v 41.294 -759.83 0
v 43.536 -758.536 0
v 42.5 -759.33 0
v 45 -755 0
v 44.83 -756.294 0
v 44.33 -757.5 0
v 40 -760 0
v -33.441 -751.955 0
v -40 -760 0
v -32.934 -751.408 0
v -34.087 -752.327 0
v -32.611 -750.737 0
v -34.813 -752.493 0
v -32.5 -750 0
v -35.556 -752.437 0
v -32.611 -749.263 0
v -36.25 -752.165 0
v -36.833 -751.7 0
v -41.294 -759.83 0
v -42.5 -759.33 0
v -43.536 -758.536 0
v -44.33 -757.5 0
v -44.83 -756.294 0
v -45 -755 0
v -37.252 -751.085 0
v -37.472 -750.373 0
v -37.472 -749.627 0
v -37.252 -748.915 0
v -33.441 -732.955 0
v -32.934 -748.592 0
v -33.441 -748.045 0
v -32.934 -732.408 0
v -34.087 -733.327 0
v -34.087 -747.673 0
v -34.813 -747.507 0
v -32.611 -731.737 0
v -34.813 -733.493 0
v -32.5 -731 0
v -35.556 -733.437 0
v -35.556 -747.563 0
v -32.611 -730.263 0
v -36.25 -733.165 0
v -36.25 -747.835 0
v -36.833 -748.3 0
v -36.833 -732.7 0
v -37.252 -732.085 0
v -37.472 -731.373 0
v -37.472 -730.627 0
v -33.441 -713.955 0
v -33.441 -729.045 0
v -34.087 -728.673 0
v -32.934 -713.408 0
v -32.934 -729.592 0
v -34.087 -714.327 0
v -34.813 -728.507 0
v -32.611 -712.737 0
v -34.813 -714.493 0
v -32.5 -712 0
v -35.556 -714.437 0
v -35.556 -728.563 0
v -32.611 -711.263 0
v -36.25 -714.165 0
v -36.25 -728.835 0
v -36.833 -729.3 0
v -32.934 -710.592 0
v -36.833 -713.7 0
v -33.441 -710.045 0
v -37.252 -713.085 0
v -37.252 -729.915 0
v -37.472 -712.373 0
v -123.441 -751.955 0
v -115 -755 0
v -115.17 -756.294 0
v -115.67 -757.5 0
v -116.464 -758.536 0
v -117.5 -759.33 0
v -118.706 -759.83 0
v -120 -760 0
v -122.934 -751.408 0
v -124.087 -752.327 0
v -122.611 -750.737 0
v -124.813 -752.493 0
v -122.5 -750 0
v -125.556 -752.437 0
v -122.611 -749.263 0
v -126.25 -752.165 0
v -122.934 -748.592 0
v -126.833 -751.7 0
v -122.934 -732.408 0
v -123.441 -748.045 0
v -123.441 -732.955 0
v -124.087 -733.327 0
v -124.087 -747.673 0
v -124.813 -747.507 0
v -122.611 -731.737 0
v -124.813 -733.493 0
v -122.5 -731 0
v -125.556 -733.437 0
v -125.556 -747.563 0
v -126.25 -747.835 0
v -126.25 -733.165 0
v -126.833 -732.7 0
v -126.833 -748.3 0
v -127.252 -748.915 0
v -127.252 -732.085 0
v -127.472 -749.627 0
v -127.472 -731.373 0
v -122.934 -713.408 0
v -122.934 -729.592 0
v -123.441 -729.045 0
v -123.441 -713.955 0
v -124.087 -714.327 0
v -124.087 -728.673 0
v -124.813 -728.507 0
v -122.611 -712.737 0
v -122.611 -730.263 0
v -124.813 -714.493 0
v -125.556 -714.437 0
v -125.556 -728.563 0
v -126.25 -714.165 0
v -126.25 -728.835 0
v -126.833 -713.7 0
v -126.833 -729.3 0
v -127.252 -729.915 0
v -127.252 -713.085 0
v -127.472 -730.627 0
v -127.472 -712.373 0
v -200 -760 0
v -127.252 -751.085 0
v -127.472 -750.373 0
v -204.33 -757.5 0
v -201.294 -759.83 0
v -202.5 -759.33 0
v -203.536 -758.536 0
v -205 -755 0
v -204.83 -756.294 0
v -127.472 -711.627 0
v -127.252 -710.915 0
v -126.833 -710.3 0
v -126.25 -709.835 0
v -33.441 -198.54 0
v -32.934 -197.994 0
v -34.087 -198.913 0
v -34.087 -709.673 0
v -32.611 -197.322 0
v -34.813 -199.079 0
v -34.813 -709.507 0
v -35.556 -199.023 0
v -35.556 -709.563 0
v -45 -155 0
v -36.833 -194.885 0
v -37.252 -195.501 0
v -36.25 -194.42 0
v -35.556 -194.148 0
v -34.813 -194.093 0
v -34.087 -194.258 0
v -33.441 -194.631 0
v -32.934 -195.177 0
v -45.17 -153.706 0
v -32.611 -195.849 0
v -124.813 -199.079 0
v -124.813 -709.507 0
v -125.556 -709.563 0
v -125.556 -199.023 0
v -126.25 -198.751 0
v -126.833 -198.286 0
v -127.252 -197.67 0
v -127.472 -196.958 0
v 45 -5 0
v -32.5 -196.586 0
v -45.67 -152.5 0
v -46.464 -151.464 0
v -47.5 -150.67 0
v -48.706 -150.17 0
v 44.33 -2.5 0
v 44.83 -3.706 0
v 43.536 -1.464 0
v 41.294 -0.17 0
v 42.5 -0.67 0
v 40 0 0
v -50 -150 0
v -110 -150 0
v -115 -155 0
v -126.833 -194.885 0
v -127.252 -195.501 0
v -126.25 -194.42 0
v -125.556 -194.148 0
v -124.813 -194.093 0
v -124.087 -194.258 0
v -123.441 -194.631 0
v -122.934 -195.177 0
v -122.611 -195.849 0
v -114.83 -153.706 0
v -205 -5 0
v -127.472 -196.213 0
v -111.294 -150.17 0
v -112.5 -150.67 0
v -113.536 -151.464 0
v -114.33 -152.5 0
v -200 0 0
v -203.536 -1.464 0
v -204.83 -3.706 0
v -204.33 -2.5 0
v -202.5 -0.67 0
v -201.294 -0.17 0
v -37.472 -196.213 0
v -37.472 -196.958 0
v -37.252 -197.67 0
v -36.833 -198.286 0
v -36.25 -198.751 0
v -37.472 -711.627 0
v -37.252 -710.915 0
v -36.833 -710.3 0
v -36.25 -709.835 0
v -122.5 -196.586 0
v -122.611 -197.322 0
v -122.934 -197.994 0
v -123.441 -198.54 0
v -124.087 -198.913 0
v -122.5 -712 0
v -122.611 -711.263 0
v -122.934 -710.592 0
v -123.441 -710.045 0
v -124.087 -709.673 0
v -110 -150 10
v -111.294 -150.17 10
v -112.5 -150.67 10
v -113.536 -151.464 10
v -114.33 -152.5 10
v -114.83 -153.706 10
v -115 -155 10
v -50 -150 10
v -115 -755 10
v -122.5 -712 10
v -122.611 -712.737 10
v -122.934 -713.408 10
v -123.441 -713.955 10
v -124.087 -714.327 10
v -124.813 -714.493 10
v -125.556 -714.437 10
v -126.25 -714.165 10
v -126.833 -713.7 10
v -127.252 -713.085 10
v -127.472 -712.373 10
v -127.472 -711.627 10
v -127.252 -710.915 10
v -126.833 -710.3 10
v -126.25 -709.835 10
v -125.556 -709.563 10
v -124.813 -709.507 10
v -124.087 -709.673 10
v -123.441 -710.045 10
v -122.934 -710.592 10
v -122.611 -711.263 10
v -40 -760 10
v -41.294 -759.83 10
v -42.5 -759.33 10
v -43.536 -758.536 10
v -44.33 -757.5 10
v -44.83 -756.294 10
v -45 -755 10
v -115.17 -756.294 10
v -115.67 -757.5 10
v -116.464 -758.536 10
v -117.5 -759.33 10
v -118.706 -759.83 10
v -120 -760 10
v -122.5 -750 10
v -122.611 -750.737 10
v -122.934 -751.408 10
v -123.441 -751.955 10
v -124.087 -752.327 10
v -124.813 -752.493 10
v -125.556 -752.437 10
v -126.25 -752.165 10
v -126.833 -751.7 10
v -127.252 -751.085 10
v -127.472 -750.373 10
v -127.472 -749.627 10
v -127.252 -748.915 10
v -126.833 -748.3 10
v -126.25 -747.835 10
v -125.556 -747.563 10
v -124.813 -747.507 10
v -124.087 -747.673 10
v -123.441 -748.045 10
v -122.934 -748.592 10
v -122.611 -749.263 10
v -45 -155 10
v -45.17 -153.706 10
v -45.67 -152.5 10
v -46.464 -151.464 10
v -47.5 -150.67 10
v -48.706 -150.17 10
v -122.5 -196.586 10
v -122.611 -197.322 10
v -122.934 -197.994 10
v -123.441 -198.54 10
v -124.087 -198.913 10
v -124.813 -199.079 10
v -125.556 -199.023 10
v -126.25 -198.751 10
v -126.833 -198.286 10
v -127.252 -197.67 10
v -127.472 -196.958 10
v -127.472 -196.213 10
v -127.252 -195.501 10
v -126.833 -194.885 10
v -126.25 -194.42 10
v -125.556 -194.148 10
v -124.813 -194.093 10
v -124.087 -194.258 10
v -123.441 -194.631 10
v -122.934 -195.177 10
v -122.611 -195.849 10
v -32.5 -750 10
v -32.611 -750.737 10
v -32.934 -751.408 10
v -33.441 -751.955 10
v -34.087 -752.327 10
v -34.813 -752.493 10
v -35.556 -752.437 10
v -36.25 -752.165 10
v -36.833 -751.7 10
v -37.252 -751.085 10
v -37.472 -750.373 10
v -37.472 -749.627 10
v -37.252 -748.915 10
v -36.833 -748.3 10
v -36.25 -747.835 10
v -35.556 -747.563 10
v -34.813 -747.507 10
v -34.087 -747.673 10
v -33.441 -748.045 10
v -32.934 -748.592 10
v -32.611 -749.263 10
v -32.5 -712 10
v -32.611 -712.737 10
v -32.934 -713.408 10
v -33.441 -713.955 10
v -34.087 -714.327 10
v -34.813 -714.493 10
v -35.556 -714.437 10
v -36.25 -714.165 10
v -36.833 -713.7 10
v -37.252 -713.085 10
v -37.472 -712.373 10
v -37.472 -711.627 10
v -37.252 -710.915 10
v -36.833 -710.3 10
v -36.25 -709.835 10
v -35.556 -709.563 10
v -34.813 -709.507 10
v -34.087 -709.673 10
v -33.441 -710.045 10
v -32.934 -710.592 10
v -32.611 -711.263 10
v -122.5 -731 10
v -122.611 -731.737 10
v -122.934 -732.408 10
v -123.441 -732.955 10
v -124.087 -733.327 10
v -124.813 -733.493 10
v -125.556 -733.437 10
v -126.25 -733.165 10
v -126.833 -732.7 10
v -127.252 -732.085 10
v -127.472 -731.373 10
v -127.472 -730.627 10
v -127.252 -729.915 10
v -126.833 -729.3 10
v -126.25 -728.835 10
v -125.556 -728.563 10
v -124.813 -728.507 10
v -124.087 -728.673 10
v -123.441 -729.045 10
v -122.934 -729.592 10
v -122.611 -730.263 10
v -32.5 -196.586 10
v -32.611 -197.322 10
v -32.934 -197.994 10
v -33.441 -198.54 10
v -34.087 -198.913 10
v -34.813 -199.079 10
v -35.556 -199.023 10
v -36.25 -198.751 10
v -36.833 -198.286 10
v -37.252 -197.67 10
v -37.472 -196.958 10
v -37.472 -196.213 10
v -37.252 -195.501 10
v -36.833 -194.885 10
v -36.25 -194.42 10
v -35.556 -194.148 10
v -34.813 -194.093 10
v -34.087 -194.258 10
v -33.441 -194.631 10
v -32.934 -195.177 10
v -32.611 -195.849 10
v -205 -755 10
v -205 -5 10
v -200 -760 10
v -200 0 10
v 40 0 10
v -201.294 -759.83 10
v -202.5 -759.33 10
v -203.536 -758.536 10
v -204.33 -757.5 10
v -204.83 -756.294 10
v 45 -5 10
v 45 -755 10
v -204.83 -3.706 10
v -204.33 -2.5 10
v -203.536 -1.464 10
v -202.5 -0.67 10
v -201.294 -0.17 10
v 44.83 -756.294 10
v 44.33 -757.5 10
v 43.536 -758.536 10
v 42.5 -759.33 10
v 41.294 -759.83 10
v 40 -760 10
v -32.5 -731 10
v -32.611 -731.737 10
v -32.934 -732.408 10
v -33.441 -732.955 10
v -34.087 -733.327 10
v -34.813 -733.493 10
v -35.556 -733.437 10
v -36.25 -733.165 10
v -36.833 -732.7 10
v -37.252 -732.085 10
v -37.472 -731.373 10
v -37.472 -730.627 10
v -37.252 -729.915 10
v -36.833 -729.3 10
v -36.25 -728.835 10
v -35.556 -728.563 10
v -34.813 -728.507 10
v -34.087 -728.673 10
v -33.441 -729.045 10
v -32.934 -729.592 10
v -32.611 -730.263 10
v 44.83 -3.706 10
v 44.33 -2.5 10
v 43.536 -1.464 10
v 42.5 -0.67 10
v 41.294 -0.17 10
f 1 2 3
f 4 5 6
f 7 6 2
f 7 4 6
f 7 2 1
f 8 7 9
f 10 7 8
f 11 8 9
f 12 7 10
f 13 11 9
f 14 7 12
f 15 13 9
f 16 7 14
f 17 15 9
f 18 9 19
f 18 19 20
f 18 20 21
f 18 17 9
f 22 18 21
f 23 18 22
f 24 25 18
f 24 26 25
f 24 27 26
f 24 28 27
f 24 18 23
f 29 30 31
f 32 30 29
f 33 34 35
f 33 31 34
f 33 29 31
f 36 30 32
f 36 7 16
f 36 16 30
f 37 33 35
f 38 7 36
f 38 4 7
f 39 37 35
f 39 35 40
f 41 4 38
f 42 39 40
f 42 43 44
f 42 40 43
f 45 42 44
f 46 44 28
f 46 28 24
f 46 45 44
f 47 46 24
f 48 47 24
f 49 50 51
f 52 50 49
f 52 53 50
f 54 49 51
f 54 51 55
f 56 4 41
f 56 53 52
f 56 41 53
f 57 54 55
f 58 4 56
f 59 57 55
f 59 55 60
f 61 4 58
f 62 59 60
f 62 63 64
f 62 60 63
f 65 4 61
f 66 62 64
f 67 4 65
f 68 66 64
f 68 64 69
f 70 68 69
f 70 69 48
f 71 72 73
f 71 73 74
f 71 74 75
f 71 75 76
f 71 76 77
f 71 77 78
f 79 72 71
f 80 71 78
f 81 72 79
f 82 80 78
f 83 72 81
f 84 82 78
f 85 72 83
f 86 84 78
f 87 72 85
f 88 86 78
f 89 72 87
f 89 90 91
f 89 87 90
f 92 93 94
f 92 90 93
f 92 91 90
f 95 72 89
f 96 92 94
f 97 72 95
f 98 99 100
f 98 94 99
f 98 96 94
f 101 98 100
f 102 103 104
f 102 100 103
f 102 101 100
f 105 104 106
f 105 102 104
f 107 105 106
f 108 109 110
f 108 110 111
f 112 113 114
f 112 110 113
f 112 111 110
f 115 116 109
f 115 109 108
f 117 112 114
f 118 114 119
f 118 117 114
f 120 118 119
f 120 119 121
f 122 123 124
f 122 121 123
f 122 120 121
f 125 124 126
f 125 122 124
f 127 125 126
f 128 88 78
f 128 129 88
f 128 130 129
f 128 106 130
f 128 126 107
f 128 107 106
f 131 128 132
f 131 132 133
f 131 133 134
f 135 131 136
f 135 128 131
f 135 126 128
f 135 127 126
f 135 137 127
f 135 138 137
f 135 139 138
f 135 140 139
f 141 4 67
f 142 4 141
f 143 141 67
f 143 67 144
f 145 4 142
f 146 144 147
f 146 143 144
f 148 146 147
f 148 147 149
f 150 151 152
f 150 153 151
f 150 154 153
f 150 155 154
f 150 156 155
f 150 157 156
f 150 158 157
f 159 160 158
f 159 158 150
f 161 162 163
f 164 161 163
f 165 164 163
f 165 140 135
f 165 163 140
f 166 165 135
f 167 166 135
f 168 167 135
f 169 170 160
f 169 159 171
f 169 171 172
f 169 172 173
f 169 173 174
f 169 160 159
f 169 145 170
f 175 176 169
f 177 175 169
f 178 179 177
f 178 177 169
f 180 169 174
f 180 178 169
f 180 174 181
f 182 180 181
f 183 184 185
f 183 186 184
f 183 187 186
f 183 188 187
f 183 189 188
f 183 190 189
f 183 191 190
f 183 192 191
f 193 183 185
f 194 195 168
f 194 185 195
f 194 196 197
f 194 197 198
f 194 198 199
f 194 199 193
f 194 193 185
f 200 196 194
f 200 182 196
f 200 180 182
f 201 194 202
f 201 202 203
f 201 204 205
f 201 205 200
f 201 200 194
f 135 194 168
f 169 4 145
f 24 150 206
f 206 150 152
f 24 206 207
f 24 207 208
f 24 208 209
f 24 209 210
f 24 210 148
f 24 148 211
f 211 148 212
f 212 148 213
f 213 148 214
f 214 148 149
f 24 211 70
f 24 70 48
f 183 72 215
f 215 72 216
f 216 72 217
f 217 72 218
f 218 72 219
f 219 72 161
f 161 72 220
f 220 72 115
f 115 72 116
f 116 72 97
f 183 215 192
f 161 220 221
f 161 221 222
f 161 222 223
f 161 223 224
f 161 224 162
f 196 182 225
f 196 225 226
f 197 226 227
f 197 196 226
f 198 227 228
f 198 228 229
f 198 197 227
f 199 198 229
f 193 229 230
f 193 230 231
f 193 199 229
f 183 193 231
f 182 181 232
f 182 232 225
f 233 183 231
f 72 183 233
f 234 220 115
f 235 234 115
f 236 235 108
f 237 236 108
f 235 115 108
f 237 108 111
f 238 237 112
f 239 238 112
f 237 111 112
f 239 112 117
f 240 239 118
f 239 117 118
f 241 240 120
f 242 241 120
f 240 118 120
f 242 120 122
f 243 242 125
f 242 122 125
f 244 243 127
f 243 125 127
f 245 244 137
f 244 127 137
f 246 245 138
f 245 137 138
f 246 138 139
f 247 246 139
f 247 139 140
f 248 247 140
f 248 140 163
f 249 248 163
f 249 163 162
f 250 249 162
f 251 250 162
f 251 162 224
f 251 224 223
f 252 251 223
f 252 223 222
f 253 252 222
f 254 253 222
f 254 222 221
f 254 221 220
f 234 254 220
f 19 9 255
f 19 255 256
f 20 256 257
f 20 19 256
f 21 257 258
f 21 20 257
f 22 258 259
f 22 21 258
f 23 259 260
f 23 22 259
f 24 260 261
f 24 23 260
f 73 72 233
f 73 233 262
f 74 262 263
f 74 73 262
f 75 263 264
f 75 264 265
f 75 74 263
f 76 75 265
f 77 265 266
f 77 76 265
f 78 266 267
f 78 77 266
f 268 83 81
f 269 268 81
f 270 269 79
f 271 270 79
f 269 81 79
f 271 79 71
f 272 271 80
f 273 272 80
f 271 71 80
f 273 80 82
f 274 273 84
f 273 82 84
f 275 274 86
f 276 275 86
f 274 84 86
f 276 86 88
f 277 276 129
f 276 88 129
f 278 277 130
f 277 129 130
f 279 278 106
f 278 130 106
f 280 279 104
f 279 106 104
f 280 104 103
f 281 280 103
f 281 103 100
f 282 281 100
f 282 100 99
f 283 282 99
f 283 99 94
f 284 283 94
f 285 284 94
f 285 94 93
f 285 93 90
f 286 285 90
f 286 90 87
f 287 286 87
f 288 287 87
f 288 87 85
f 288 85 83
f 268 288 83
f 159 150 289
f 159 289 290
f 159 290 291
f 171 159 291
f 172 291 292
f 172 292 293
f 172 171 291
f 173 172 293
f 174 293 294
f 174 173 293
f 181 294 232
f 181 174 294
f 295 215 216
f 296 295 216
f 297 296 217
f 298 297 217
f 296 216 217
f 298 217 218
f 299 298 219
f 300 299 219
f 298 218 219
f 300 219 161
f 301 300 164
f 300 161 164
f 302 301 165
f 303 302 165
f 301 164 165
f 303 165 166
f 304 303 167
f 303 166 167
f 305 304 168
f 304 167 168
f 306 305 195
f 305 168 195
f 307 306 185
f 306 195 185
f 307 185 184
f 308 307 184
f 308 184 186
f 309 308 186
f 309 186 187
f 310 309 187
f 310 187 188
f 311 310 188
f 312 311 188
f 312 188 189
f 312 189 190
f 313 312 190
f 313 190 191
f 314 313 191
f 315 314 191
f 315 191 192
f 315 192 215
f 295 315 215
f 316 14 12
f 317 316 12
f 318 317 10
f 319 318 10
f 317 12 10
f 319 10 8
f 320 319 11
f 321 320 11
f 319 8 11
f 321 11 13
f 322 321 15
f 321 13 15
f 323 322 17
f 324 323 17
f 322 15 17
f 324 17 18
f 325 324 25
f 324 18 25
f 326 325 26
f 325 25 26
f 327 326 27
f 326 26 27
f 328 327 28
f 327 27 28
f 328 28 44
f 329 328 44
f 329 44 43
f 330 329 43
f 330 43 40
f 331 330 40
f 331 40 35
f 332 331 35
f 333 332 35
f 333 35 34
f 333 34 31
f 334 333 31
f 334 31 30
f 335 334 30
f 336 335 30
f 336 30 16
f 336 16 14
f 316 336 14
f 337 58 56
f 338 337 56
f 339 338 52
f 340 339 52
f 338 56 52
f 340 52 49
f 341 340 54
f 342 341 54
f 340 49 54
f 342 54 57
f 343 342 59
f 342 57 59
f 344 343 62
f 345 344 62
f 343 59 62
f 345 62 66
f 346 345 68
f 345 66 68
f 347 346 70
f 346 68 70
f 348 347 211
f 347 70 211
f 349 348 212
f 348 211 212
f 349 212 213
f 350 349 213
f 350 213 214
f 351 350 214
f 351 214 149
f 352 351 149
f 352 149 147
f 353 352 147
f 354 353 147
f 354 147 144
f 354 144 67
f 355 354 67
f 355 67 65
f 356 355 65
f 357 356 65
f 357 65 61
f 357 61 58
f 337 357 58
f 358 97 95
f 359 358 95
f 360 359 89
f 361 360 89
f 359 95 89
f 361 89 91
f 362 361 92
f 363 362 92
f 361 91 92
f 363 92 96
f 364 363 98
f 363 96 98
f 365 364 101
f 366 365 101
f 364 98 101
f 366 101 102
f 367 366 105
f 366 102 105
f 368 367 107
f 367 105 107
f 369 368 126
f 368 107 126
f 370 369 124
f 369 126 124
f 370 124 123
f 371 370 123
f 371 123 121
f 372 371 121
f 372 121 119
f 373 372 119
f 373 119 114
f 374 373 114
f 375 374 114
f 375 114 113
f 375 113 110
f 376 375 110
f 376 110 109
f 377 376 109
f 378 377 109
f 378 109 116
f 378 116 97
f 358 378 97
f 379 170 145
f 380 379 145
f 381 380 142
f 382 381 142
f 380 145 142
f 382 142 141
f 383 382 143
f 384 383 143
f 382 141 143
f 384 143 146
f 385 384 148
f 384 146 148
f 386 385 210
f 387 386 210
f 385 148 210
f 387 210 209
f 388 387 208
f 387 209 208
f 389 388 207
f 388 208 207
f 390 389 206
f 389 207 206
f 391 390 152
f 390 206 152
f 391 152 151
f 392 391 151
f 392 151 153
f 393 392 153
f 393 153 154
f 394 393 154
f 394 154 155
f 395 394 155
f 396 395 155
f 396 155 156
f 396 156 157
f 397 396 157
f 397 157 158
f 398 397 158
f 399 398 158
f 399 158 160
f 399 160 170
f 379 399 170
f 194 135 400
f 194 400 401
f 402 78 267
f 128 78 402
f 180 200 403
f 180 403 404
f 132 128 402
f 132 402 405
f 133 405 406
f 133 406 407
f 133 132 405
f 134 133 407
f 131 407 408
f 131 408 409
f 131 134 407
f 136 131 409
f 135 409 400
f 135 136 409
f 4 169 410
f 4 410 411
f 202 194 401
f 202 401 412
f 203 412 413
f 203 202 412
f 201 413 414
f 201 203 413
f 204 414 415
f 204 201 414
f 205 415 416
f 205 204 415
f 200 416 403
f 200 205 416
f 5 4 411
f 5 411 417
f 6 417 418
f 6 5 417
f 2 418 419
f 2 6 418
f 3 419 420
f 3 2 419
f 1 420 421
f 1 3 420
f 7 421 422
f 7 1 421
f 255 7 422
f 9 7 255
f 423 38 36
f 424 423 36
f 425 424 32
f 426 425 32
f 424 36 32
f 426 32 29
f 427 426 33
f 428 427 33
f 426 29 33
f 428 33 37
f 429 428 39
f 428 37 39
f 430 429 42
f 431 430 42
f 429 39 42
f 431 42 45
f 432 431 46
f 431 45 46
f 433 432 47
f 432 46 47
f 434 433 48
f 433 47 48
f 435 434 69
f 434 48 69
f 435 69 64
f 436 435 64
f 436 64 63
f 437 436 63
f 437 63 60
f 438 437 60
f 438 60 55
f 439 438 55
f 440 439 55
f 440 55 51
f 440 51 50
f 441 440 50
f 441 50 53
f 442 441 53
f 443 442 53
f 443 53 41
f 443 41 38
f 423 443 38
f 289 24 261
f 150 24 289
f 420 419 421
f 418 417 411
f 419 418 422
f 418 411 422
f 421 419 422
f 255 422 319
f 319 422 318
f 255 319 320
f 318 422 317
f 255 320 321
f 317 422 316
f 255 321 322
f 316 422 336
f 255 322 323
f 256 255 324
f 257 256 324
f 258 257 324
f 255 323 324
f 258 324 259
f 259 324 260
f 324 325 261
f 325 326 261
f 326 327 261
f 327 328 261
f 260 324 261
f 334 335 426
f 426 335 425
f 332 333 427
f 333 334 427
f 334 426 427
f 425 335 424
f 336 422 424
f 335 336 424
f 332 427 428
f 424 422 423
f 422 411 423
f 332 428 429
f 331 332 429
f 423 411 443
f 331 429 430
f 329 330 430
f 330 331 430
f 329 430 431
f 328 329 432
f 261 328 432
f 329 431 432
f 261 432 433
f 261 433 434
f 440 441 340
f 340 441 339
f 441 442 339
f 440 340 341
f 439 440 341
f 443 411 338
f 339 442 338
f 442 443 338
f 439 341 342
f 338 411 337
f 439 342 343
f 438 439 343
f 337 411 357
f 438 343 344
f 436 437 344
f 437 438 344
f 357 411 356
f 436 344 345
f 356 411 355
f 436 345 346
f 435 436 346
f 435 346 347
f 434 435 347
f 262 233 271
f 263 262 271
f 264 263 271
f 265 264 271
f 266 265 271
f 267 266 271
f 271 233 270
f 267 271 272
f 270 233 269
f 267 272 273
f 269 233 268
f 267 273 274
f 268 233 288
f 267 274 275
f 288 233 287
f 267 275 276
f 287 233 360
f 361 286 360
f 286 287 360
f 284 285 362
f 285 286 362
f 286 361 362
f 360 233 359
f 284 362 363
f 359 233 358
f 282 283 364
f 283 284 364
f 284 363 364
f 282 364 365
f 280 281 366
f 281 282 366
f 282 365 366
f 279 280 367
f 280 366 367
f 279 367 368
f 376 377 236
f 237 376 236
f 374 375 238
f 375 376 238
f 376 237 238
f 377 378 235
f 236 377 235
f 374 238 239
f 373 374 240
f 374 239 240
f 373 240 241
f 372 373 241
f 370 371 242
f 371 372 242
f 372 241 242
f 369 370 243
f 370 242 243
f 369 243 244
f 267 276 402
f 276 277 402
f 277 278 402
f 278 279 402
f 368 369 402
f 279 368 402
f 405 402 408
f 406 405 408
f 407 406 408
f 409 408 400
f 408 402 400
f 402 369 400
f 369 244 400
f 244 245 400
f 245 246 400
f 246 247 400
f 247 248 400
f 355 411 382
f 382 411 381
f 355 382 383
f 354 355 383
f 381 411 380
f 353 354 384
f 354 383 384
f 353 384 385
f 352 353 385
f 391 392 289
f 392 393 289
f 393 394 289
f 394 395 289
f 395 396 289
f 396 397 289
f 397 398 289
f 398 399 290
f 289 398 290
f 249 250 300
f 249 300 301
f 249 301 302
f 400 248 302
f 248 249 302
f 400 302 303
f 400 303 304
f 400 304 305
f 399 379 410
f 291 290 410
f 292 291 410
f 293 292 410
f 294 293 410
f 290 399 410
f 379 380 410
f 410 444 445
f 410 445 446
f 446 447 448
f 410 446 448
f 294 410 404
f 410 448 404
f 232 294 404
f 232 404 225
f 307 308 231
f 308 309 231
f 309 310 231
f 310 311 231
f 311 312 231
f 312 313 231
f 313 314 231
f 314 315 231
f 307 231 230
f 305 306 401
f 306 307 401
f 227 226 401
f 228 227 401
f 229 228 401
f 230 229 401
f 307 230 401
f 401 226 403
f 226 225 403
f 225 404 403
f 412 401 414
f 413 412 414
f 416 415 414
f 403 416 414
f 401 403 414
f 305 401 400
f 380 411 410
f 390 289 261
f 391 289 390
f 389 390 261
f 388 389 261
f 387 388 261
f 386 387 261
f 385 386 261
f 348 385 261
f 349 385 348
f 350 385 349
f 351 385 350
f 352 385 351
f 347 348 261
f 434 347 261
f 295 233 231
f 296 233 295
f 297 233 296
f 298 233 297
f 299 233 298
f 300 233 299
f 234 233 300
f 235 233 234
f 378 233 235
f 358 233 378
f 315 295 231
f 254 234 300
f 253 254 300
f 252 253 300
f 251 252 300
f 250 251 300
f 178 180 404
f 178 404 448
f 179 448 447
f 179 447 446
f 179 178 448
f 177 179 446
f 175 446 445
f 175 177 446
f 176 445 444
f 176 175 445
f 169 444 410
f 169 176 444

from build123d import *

# Parameters (mm, degrees)
BOSS_EXTRUDE1_DEPTH = 10
M6_TAPPED_HOLE_D    = 5


with BuildPart() as part:
    # Sketch1 → Boss-Extrude1 (new body)
    with BuildSketch(Plane.XY):
        with BuildLine():
            Line((-120, -760), (-200, -760))
            ThreePointArc((-200, -760), (-203.535533906, -758.535533906), (-205, -755))
            Line((-205, -755), (-205, -5))
            ThreePointArc((-205, -5), (-203.535533906, -1.464466094), (-200, 0))
            Line((-200, 0), (40, 0))
            ThreePointArc((40, 0), (43.535533906, -1.464466094), (45, -5))
            Line((45, -5), (45, -755))
            ThreePointArc((45, -755), (43.535533906, -758.535533906), (40, -760))
            Line((40, -760), (-40, -760))
            ThreePointArc((-40, -760), (-43.535533906, -758.535533906), (-45, -755))
            Line((-45, -755), (-45, -155))
            ThreePointArc((-45, -155), (-46.464466094, -151.464466094), (-50, -150))
            Line((-50, -150), (-110, -150))
            ThreePointArc((-110, -150), (-113.535533906, -151.464466094), (-115, -155))
            Line((-115, -155), (-115, -755))
            ThreePointArc((-115, -755), (-116.464466094, -758.535533906), (-120, -760))
        make_face()
    extrude(amount=BOSS_EXTRUDE1_DEPTH)

    # M6 Tapped Hole (through all)
    with Locations(Plane(origin=(479.845790405, 700.886073068, 20), x_dir=(-1, 0, 0), z_dir=(0, 0, 1))):
        with Locations((514.845790405, 897.471608895), (537.845790405, 897.471608895), (581.845790405, 897.471608895), (604.845790405, 897.471608895), (514.845790405, 1450.886073068), (514.845790405, 1412.886073068), (537.845790405, 1453.886073068), (537.845790405, 1409.886073068), (581.845790405, 1453.886073068), (581.845790405, 1409.886073068), (604.845790405, 1450.886073068), (604.845790405, 1412.886073068), (514.845790405, 1431.886073068), (537.845790405, 1431.886073068), (581.845790405, 1431.886073068), (604.845790405, 1431.886073068)):
            Hole(M6_TAPPED_HOLE_D / 2)


solid = part.part
